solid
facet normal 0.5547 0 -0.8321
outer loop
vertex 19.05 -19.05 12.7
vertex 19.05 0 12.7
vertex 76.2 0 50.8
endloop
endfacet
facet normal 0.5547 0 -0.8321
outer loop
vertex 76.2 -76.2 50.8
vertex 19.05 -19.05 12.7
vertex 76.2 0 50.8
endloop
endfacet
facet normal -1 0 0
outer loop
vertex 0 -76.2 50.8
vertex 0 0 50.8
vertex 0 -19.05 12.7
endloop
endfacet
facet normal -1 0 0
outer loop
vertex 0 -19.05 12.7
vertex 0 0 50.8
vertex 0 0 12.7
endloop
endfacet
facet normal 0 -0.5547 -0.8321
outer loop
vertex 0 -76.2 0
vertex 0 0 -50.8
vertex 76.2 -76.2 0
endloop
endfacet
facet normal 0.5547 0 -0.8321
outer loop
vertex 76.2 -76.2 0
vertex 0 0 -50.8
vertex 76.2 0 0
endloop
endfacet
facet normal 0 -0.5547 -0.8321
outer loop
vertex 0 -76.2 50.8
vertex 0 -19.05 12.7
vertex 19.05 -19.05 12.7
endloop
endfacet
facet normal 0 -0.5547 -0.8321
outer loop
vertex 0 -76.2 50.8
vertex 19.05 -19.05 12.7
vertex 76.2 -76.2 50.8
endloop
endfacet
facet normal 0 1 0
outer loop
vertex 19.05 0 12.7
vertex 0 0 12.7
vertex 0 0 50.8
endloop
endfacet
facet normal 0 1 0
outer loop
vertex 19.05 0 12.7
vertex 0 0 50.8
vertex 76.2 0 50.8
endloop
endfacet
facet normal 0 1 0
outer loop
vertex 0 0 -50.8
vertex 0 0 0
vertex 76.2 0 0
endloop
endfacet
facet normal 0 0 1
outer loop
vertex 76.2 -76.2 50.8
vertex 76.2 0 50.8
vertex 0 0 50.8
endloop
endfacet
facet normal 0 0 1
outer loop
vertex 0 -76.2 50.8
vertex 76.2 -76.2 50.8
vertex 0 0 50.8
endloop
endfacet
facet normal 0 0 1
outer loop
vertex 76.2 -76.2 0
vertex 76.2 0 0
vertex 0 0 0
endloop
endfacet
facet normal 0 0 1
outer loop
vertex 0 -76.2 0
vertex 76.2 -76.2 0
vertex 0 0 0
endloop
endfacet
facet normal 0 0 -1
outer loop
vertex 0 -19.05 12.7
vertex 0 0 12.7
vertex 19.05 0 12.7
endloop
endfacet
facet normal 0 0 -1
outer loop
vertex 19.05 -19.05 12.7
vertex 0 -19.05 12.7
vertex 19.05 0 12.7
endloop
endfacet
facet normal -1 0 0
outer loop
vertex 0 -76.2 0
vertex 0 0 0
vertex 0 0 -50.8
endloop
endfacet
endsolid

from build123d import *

# Parameters (mm, degrees)
F2_DEPTH = 76.2
F4_DEPTH = 76.201


with BuildPart() as f2:
    # F1 (on Front) → F2 (new body)
    with BuildSketch(Plane.XZ):
        Polygon((19.05, 12.7), (76.2, 50.8), (0, 50.8), (0, 12.7), align=None)
    extrude(amount=F2_DEPTH)


with BuildPart() as f2b:
    # F1 (on Front) → F2, piece 2 (new body)
    with BuildSketch(Plane.XZ):
        Polygon((0, 0), (0, -50.8), (76.2, 0), align=None)
    extrude(amount=F2_DEPTH)


with BuildPart() as f4_tool:
    # F3 (on Right) → F4 (new body, through all)
    with BuildSketch(Plane.YZ):
        Polygon((-19.05, 12.7), (-76.2, 50.8), (-76.2, 12.7), align=None)
        Polygon((-76.2, -50.8), (0, -50.8), (-76.2, 0), align=None)
    extrude(amount=F4_DEPTH)


with BuildPart() as f2_1:
    add(f2.part)

    # F4: cut by f4_tool
    add(f4_tool.part, mode=Mode.SUBTRACT)


with BuildPart() as f2b_1:
    add(f2b.part)

    # F4: cut by f4_tool
    add(f4_tool.part, mode=Mode.SUBTRACT)


solid = Compound([f2_1.part, f2b_1.part])
